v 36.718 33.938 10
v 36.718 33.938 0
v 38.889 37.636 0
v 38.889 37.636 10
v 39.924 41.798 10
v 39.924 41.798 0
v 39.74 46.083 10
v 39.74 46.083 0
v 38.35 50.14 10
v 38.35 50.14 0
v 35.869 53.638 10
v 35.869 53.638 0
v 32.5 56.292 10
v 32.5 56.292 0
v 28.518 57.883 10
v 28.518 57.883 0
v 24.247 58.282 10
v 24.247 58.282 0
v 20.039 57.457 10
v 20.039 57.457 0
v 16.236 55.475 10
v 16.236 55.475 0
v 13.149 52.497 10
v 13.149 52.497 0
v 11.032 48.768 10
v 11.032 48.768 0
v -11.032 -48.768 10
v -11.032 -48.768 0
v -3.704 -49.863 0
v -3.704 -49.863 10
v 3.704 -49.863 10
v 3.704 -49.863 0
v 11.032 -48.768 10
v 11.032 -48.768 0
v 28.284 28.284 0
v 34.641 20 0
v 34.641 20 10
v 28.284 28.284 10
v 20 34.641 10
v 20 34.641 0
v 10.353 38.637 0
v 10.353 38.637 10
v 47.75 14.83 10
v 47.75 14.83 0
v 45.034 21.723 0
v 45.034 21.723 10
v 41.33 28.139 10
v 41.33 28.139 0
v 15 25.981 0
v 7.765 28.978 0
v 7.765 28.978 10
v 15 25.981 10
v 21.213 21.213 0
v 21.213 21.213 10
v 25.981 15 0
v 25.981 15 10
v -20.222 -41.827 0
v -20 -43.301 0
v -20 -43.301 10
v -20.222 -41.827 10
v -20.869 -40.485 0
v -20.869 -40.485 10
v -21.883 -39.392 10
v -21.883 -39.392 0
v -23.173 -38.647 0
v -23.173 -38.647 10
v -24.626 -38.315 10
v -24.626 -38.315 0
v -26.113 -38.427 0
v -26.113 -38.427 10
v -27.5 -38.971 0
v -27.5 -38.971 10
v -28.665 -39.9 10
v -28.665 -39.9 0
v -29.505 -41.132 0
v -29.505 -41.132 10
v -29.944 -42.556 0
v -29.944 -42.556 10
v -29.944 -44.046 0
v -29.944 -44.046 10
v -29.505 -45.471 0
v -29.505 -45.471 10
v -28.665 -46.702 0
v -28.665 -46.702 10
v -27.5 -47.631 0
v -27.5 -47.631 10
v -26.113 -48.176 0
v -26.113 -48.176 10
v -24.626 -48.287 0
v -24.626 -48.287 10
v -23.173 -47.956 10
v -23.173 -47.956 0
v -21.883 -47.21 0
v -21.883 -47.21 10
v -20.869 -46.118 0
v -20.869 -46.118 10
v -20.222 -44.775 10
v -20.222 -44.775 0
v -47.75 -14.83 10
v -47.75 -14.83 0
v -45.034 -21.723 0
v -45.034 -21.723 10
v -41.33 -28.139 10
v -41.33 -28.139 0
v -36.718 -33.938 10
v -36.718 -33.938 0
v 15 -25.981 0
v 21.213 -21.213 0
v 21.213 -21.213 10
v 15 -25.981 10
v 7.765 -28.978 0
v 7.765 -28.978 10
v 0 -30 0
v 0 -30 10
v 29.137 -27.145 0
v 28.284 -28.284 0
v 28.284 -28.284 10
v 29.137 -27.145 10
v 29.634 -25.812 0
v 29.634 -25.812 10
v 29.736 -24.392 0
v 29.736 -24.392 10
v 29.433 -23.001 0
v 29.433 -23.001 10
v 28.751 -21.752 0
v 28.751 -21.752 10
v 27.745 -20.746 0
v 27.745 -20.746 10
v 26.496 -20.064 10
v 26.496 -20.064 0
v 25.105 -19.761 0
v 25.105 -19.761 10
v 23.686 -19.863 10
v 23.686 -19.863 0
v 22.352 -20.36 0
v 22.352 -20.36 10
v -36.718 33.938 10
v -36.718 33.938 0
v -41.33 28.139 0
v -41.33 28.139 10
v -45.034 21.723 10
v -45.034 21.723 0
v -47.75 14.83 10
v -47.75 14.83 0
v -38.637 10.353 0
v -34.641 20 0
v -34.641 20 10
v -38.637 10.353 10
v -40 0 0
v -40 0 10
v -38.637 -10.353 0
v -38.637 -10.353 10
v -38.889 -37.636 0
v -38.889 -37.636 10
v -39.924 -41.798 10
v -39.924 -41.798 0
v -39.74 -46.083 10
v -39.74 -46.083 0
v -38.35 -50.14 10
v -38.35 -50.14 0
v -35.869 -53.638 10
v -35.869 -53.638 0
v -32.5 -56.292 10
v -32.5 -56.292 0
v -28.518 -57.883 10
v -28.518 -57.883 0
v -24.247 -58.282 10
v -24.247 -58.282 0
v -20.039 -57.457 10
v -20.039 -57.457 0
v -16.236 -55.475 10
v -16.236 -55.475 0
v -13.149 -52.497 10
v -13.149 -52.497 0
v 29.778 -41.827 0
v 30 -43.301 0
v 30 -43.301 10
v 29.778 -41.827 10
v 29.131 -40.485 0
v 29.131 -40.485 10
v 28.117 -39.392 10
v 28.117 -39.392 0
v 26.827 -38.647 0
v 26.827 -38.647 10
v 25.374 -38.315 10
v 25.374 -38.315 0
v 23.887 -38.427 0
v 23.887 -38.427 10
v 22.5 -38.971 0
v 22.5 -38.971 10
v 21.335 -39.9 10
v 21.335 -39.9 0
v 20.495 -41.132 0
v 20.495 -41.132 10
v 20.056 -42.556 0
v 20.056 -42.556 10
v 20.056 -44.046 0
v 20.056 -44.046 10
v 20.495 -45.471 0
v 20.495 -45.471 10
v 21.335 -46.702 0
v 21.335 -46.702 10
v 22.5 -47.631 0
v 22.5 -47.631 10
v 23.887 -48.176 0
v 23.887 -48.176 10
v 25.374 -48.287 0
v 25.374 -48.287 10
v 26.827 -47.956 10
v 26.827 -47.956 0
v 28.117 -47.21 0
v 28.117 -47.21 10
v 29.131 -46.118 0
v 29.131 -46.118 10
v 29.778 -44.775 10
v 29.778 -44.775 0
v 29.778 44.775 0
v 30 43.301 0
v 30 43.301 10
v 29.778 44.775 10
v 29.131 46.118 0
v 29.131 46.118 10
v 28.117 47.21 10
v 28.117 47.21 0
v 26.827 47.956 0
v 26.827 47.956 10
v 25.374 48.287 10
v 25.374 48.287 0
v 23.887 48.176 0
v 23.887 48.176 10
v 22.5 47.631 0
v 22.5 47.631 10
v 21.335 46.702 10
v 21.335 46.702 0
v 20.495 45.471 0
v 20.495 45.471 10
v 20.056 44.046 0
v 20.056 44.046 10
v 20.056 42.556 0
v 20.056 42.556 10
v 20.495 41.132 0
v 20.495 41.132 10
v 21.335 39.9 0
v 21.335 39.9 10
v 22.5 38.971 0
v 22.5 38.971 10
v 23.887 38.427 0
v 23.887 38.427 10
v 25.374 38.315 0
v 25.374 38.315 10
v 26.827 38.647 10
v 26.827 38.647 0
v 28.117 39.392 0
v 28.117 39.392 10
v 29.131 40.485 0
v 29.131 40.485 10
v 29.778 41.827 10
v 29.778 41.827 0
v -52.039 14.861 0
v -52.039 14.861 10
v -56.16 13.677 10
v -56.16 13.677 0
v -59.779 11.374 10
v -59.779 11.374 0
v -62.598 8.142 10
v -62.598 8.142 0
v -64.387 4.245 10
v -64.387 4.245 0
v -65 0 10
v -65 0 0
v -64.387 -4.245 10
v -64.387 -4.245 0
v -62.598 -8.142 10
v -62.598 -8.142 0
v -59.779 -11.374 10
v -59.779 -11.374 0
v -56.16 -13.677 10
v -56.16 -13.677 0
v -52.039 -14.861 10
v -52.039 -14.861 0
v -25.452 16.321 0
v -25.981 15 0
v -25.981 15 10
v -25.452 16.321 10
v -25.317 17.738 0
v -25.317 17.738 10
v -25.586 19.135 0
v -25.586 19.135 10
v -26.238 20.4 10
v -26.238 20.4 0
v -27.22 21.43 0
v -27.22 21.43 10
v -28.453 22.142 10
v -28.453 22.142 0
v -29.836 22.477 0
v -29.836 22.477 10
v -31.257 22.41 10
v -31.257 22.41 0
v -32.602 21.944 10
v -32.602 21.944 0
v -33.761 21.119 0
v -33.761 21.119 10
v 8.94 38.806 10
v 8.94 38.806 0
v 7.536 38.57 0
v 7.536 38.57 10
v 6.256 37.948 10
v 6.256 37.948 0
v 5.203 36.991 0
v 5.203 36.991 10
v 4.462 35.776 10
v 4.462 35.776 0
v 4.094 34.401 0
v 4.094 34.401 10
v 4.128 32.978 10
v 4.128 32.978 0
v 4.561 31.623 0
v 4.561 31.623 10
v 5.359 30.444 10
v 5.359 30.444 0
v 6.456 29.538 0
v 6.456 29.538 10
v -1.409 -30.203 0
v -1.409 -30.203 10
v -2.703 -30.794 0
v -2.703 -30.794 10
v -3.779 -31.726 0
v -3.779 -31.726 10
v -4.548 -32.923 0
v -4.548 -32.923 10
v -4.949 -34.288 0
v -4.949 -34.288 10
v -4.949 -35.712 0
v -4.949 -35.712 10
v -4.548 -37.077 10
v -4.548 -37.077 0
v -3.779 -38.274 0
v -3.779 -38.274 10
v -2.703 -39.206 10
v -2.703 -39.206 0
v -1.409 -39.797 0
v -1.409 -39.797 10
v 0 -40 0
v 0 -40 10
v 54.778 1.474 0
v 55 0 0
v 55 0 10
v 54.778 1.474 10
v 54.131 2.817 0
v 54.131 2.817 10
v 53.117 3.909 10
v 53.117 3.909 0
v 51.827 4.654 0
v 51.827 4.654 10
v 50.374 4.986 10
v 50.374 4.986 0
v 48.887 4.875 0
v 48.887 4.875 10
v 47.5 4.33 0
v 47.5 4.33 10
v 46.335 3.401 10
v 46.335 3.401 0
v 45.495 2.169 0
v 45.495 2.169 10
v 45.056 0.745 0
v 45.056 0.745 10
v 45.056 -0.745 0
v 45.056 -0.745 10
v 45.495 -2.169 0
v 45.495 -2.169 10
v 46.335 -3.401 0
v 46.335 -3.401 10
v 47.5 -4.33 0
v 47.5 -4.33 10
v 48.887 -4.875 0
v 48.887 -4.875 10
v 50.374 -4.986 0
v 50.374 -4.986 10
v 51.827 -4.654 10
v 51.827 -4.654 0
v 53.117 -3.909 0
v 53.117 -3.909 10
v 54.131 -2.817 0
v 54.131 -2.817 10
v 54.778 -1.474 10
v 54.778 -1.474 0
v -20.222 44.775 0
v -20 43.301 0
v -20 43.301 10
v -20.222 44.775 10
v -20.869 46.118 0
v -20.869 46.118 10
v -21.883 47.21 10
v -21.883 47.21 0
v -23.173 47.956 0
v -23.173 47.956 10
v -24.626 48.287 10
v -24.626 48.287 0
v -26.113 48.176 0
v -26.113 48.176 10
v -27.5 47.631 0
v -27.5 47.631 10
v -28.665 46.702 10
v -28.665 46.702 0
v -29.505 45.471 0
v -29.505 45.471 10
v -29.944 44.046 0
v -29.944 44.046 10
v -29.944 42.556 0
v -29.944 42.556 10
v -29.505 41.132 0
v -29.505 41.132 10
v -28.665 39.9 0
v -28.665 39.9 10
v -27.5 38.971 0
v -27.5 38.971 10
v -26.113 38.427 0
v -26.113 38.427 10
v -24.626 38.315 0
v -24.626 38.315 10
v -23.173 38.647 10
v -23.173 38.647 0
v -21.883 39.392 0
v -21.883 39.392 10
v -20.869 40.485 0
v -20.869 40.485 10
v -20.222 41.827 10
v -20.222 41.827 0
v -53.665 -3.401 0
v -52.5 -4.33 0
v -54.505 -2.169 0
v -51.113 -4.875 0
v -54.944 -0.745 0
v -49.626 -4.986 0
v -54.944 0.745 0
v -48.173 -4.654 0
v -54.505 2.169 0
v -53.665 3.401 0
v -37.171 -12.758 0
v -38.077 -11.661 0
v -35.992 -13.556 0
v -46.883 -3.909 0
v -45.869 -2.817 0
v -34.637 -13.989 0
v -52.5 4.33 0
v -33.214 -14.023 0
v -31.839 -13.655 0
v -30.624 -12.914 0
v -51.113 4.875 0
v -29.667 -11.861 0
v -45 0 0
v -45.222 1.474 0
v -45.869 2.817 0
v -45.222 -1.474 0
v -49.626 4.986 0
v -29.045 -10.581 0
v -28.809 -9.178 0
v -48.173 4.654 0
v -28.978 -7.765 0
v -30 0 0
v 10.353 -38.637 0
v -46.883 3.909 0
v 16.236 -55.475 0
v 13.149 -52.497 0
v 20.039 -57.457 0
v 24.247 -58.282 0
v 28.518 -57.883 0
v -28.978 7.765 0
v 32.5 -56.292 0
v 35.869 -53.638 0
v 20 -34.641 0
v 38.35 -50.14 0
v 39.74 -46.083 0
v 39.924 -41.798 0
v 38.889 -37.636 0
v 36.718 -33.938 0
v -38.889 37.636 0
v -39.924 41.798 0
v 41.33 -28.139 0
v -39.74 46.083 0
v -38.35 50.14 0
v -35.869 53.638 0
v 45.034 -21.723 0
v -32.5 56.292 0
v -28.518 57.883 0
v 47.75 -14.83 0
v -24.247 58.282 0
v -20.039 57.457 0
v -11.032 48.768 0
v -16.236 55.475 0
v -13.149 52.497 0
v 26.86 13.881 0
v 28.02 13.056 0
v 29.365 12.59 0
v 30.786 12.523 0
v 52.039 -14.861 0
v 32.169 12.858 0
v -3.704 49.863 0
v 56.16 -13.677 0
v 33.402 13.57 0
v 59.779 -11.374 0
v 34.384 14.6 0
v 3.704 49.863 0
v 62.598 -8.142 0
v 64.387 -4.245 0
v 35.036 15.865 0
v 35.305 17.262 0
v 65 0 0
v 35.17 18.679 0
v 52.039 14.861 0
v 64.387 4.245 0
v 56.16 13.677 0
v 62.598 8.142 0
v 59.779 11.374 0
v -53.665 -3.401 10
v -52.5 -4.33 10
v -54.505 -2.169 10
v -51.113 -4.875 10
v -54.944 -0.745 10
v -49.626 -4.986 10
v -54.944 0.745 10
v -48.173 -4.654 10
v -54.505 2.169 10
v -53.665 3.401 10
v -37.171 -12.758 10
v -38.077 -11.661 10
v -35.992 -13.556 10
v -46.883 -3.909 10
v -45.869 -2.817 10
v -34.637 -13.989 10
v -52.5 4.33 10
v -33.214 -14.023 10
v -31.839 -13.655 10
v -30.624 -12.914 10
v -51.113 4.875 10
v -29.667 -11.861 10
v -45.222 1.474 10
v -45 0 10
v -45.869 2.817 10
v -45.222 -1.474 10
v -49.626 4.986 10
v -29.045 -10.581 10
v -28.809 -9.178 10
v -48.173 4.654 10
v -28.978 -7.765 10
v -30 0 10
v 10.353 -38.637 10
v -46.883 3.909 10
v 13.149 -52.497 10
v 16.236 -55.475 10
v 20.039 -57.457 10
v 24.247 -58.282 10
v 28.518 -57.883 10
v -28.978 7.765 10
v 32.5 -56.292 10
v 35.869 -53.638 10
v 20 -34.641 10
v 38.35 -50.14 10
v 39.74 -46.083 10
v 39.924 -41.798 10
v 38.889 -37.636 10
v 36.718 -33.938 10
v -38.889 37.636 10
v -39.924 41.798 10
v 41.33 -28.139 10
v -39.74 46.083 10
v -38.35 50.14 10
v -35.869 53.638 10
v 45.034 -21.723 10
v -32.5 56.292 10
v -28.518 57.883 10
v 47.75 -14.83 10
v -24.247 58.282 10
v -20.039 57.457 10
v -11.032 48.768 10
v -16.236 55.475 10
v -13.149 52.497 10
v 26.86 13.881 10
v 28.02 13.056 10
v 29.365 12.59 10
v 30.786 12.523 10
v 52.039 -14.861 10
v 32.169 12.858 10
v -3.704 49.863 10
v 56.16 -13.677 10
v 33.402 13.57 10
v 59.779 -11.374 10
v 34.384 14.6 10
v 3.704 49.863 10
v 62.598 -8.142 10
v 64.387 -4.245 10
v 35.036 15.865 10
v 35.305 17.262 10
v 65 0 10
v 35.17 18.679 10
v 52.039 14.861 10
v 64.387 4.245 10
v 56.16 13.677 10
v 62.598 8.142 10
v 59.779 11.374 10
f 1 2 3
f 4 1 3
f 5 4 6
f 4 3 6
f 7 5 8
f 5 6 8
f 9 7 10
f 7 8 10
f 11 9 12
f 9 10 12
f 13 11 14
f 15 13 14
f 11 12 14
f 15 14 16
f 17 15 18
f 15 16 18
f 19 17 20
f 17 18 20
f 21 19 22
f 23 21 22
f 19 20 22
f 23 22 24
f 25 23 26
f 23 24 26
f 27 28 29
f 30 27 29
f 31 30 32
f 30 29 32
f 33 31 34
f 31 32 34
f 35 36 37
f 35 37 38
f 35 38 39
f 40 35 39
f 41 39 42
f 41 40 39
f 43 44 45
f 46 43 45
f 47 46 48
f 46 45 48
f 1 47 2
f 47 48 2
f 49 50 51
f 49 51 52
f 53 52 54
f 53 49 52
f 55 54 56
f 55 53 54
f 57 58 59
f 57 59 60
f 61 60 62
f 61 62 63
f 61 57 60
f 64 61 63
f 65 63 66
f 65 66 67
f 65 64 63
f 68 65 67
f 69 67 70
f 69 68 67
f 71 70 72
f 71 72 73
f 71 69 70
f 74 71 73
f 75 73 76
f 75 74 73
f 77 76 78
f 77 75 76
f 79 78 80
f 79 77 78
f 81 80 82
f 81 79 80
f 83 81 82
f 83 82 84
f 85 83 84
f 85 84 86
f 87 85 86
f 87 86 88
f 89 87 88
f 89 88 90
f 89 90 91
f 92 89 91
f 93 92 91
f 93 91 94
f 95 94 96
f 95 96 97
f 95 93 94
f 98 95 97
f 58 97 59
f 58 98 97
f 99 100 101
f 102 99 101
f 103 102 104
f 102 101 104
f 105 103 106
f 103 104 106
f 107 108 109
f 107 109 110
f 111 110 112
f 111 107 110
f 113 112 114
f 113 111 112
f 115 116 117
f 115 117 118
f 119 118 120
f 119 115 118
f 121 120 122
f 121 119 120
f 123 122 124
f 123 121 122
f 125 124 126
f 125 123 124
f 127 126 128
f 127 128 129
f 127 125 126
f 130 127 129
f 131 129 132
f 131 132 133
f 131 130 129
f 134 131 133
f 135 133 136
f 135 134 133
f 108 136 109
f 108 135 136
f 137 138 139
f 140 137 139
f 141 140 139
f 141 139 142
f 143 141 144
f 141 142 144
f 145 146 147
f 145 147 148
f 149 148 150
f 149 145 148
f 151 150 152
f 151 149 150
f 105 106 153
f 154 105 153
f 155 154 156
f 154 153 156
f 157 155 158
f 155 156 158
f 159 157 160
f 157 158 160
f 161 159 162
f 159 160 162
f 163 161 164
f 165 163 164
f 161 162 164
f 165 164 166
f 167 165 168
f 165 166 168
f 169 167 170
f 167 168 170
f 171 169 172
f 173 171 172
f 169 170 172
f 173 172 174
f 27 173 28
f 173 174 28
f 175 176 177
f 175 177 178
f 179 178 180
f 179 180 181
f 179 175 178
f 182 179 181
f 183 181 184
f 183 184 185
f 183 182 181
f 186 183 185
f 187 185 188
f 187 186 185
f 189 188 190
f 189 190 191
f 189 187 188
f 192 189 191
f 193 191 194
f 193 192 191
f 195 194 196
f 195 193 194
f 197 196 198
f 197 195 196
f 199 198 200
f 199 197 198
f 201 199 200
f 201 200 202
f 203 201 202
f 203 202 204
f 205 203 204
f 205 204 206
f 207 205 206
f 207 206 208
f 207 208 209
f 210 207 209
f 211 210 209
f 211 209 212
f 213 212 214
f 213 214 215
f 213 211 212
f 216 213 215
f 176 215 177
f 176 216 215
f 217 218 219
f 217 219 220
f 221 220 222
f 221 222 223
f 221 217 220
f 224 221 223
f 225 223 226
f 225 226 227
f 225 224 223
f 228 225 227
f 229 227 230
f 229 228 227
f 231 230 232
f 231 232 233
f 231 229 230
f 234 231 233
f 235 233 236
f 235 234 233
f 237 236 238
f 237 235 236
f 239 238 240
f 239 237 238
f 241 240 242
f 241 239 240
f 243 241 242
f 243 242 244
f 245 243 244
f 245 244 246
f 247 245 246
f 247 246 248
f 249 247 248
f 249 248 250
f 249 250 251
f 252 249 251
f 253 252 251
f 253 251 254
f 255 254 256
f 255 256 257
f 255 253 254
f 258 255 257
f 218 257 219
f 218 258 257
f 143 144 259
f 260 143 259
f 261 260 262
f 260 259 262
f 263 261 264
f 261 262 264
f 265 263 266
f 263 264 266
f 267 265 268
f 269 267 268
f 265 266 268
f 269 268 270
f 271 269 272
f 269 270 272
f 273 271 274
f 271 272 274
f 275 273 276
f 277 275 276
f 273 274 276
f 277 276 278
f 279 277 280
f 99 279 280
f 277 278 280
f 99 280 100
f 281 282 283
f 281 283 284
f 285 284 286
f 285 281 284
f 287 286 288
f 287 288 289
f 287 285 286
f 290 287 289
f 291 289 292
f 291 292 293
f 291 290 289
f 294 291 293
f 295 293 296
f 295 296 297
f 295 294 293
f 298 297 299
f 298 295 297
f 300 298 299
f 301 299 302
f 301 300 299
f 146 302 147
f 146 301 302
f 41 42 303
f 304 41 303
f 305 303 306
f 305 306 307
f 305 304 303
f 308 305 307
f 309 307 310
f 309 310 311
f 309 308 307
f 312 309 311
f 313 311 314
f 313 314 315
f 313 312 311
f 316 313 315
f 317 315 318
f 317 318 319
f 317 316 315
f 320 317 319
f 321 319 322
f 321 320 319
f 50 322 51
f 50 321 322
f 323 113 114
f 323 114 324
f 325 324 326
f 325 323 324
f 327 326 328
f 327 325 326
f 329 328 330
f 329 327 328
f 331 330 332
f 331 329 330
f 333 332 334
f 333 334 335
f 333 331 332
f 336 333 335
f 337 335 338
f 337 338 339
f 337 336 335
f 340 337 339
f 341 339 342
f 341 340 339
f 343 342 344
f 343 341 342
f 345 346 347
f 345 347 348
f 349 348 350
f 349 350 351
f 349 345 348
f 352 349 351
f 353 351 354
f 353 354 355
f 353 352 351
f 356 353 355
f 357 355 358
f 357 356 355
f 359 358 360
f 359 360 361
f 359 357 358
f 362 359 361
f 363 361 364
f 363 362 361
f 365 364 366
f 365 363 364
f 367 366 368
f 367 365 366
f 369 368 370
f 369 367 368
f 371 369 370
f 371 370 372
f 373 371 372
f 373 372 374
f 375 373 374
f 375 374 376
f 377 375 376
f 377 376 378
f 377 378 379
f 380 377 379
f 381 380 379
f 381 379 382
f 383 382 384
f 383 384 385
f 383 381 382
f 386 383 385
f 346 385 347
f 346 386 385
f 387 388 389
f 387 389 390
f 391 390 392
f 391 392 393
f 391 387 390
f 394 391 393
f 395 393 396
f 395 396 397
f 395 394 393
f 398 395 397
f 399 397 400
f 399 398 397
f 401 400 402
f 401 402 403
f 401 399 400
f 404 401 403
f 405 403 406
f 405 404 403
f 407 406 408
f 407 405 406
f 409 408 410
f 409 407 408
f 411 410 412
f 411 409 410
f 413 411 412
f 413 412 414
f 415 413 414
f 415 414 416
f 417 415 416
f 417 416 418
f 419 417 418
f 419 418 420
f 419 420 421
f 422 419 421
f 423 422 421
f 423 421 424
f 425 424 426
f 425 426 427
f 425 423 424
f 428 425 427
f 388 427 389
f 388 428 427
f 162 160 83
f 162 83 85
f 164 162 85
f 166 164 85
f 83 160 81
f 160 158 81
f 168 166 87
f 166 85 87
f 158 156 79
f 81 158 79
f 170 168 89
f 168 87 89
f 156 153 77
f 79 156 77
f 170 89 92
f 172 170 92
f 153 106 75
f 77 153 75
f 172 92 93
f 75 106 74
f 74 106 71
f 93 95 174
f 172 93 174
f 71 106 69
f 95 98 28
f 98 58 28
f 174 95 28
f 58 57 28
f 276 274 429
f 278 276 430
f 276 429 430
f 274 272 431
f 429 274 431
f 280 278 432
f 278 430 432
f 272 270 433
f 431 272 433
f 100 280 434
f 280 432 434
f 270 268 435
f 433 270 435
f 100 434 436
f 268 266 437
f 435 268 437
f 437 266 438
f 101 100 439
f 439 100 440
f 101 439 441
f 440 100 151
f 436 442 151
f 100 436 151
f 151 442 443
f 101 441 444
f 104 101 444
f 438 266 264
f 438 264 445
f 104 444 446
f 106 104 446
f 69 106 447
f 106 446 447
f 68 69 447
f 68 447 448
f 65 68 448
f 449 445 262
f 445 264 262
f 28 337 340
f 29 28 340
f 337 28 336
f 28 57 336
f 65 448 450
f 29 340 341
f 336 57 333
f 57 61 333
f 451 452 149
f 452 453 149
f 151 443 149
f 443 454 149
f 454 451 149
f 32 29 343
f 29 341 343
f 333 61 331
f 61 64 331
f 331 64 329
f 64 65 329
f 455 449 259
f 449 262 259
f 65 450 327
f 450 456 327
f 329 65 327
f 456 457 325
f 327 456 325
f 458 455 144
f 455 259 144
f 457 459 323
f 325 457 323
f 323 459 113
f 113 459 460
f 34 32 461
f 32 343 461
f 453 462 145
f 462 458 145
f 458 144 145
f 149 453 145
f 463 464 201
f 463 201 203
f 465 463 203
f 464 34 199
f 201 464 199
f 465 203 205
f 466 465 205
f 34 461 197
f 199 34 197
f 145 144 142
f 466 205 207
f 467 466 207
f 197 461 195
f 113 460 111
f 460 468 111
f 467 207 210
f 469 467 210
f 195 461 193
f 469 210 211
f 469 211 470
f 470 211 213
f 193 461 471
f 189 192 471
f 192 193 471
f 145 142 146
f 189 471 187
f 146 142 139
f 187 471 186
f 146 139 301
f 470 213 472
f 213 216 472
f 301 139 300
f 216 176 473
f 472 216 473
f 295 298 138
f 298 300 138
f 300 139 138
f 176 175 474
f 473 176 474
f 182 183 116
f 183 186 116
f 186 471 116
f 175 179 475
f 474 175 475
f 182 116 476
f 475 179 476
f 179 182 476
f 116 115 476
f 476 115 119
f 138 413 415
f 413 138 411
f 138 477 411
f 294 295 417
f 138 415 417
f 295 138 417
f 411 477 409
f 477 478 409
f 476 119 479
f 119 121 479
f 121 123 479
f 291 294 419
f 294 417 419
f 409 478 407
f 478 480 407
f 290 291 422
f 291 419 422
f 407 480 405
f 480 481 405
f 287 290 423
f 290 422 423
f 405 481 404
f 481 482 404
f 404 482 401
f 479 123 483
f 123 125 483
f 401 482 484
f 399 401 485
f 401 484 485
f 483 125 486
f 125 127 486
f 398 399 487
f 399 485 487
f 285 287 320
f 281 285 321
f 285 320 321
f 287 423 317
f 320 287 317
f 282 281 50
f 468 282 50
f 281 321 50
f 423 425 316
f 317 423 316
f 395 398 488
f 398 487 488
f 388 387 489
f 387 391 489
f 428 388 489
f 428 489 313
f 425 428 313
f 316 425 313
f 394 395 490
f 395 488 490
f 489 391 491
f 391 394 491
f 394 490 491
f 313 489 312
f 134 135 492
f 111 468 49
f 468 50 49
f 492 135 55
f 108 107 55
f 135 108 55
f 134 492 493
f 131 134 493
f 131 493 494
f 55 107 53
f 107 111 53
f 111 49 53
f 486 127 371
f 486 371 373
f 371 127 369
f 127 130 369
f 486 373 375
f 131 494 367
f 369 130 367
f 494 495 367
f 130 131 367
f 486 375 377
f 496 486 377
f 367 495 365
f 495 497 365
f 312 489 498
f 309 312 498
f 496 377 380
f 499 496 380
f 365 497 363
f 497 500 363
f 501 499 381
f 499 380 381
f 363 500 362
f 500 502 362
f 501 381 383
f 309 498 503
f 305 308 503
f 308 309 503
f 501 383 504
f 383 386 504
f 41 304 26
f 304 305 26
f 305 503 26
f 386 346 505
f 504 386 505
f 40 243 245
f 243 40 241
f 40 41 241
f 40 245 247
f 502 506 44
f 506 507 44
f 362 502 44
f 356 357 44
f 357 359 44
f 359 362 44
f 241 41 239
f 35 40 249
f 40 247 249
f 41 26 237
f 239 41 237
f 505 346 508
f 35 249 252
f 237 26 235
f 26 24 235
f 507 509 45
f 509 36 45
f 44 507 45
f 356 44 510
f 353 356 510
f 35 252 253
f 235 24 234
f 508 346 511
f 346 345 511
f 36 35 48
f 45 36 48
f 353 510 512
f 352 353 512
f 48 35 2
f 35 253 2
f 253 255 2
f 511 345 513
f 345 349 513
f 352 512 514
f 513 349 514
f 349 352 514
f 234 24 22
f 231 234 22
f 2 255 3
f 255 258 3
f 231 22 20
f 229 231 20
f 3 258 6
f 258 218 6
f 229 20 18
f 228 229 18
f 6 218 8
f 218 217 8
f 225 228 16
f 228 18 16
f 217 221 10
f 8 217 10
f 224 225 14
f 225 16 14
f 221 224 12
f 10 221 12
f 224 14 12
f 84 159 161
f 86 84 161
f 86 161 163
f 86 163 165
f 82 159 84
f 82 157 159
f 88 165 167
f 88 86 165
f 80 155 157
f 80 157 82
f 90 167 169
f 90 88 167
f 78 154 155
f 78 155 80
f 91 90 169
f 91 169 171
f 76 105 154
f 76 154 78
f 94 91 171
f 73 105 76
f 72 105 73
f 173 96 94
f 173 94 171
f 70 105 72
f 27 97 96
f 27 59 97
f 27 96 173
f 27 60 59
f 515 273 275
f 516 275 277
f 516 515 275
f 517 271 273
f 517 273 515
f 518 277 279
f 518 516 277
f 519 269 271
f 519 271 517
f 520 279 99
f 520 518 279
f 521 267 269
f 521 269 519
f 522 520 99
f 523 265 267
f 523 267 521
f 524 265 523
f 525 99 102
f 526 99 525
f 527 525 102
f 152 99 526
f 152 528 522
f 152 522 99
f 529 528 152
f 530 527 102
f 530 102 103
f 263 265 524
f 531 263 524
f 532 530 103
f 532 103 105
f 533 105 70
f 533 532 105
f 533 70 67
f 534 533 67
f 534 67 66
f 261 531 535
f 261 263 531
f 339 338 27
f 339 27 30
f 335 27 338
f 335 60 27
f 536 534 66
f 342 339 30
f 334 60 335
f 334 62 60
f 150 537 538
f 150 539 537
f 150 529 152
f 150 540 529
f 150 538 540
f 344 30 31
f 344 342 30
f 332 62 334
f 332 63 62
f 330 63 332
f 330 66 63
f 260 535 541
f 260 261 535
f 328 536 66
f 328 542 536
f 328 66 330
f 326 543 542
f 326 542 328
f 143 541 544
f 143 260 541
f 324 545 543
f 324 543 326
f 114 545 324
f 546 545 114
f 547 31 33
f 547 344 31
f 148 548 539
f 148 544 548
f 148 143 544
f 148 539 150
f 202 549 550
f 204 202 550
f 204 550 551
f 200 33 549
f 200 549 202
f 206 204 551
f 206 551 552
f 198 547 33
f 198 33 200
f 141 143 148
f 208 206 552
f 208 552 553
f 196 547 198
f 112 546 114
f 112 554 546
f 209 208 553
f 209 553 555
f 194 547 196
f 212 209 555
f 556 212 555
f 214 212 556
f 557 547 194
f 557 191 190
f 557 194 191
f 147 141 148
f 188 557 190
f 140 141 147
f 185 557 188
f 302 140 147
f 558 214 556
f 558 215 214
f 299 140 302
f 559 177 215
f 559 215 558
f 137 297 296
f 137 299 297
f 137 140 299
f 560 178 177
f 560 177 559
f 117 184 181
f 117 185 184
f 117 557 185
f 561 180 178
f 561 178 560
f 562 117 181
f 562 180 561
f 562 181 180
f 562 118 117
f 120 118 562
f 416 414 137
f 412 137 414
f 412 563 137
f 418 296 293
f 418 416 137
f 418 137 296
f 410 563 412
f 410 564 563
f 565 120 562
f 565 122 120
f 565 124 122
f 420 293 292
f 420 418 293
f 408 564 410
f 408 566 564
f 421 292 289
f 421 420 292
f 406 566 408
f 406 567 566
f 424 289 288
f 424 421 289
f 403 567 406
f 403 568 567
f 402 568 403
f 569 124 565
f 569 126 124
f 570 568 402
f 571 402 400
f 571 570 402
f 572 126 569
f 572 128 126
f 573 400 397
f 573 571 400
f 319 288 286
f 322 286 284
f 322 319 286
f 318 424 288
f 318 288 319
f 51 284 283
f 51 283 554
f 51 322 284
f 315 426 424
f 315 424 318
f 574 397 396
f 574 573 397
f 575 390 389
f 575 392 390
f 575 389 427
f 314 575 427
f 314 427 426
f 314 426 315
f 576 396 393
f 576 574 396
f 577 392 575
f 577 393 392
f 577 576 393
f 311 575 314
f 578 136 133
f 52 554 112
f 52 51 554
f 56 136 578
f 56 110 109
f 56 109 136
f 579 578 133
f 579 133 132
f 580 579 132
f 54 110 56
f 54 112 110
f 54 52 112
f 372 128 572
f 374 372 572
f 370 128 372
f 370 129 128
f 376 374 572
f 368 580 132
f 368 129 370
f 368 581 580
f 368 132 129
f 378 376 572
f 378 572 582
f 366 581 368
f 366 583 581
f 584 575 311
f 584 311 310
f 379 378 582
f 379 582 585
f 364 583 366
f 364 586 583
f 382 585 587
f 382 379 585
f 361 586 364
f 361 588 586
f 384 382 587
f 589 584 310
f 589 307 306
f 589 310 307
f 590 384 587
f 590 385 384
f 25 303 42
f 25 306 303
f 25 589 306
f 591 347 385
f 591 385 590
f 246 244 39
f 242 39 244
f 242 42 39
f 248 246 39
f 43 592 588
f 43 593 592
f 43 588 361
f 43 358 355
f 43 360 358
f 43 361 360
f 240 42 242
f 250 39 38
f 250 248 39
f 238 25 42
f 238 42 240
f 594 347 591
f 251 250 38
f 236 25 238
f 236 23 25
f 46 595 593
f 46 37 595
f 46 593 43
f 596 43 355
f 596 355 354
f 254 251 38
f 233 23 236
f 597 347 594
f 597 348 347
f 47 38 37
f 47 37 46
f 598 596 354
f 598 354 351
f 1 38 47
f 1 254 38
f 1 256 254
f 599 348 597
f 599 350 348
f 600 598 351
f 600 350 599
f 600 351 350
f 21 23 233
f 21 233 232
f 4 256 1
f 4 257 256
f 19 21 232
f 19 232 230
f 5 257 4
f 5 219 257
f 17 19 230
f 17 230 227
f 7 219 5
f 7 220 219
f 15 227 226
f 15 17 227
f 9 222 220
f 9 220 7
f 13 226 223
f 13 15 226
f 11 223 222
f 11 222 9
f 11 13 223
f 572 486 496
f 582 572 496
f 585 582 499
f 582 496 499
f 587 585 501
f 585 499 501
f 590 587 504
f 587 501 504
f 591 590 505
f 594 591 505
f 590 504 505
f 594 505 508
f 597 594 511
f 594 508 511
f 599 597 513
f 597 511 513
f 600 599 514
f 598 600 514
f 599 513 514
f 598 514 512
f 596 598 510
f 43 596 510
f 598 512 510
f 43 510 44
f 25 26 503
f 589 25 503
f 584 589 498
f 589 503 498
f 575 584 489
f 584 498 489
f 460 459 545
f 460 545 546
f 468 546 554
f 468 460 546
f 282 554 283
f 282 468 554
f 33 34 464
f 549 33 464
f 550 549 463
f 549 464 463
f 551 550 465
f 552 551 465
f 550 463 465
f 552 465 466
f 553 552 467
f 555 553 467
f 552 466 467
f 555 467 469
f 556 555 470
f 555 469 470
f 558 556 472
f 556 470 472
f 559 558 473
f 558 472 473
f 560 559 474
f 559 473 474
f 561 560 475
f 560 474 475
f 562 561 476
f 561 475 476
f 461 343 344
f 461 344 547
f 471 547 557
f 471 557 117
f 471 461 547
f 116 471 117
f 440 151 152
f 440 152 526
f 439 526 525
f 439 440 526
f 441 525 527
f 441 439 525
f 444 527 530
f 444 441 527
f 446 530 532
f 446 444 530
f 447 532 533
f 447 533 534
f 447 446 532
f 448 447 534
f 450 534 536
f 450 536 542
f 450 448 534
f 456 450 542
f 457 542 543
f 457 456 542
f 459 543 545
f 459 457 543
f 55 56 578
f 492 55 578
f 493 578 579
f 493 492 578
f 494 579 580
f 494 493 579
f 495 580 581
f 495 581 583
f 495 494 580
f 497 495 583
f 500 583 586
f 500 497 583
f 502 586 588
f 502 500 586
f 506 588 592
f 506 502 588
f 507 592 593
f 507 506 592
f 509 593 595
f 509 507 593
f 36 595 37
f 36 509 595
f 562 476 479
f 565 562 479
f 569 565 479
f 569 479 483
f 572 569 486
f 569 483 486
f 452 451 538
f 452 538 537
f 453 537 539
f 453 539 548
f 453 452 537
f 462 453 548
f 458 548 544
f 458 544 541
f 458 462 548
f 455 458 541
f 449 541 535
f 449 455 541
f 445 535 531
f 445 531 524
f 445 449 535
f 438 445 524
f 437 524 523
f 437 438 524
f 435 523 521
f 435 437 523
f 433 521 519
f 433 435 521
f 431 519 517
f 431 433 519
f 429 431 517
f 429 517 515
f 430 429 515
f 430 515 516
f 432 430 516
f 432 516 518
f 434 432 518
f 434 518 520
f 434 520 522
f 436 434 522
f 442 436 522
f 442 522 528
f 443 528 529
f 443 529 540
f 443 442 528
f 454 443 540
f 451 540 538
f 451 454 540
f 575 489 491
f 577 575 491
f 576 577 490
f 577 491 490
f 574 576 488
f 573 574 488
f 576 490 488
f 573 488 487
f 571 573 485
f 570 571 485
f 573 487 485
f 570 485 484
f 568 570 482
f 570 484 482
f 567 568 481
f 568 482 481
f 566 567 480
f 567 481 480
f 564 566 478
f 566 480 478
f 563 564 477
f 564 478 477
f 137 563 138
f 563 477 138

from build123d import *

# Parameters (mm, degrees)
SKETCH1_R           = 5
BOSS_EXTRUDE1_DEPTH = 10


with BuildPart() as part:
    # Sketch1 → Boss-Extrude1 (new body)
    with BuildSketch(Plane.XY):
        with BuildLine():
            ThreePointArc((-47.75, 14.83028995), (-65, 0), (-47.75, -14.83028995))
            ThreePointArc((-47.75, -14.83028995), (-43.301270189, -25), (-36.718407842, -33.937568056))
            ThreePointArc((-36.718407842, -33.937568056), (-32.5, -56.291651246), (-11.031592158, -48.767858006))
            ThreePointArc((-11.031592158, -48.767858006), (0, -50), (11.031592158, -48.767858006))
            ThreePointArc((11.031592158, -48.767858006), (32.5, -56.291651246), (36.718407842, -33.937568056))
            ThreePointArc((36.718407842, -33.937568056), (43.301270189, -25), (47.75, -14.83028995))
            ThreePointArc((47.75, -14.83028995), (65, 0), (47.75, 14.83028995))
            ThreePointArc((47.75, 14.83028995), (43.301270189, 25), (36.718407842, 33.937568056))
            ThreePointArc((36.718407842, 33.937568056), (32.5, 56.291651246), (11.031592158, 48.767858006))
            ThreePointArc((11.031592158, 48.767858006), (0, 50), (-11.031592158, 48.767858006))
            ThreePointArc((-11.031592158, 48.767858006), (-32.5, 56.291651246), (-36.718407842, 33.937568056))
            ThreePointArc((-36.718407842, 33.937568056), (-43.301270189, 25), (-47.75, 14.83028995))
        make_face()
        with Locations((-50, 0)):
            Circle(SKETCH1_R, mode=Mode.SUBTRACT)
        with Locations((-25, 43.301270189)):
            Circle(SKETCH1_R, mode=Mode.SUBTRACT)
        with Locations((25, 43.301270189)):
            Circle(SKETCH1_R, mode=Mode.SUBTRACT)
        with Locations((50, 0)):
            Circle(SKETCH1_R, mode=Mode.SUBTRACT)
        with Locations((25, -43.301270189)):
            Circle(SKETCH1_R, mode=Mode.SUBTRACT)
        with Locations((-25, -43.301270189)):
            Circle(SKETCH1_R, mode=Mode.SUBTRACT)
        with BuildLine():
            ThreePointArc((34.641016151, 20), (24.35045716, 31.734133612), (10.352761804, 38.637033052))
            ThreePointArc((10.352761804, 38.637033052), (4.229037447, 35.101499146), (7.764571353, 28.977774789))
            ThreePointArc((7.764571353, 28.977774789), (18.26284287, 23.800600209), (25.980762114, 15))
            ThreePointArc((25.980762114, 15), (32.810889132, 13.169872981), (34.641016151, 20))
        make_face(mode=Mode.SUBTRACT)
        with BuildLine():
            ThreePointArc((0, -40), (15.307337295, -36.9551813), (28.284271247, -28.284271247))
            ThreePointArc((28.284271247, -28.284271247), (28.284271247, -21.213203436), (21.213203436, -21.213203436))
            ThreePointArc((21.213203436, -21.213203436), (11.480502971, -27.716385975), (0, -30))
            ThreePointArc((0, -30), (-5, -35), (0, -40))
        make_face(mode=Mode.SUBTRACT)
        with BuildLine():
            ThreePointArc((-34.641016151, 20), (-39.657794455, 5.221047689), (-38.637033052, -10.352761804))
            ThreePointArc((-38.637033052, -10.352761804), (-32.513308695, -13.88829571), (-28.977774789, -7.764571353))
            ThreePointArc((-28.977774789, -7.764571353), (-29.743345841, 3.915785767), (-25.980762114, 15))
            ThreePointArc((-25.980762114, 15), (-27.810889132, 21.830127019), (-34.641016151, 20))
        make_face(mode=Mode.SUBTRACT)
    extrude(amount=BOSS_EXTRUDE1_DEPTH)


solid = part.part
